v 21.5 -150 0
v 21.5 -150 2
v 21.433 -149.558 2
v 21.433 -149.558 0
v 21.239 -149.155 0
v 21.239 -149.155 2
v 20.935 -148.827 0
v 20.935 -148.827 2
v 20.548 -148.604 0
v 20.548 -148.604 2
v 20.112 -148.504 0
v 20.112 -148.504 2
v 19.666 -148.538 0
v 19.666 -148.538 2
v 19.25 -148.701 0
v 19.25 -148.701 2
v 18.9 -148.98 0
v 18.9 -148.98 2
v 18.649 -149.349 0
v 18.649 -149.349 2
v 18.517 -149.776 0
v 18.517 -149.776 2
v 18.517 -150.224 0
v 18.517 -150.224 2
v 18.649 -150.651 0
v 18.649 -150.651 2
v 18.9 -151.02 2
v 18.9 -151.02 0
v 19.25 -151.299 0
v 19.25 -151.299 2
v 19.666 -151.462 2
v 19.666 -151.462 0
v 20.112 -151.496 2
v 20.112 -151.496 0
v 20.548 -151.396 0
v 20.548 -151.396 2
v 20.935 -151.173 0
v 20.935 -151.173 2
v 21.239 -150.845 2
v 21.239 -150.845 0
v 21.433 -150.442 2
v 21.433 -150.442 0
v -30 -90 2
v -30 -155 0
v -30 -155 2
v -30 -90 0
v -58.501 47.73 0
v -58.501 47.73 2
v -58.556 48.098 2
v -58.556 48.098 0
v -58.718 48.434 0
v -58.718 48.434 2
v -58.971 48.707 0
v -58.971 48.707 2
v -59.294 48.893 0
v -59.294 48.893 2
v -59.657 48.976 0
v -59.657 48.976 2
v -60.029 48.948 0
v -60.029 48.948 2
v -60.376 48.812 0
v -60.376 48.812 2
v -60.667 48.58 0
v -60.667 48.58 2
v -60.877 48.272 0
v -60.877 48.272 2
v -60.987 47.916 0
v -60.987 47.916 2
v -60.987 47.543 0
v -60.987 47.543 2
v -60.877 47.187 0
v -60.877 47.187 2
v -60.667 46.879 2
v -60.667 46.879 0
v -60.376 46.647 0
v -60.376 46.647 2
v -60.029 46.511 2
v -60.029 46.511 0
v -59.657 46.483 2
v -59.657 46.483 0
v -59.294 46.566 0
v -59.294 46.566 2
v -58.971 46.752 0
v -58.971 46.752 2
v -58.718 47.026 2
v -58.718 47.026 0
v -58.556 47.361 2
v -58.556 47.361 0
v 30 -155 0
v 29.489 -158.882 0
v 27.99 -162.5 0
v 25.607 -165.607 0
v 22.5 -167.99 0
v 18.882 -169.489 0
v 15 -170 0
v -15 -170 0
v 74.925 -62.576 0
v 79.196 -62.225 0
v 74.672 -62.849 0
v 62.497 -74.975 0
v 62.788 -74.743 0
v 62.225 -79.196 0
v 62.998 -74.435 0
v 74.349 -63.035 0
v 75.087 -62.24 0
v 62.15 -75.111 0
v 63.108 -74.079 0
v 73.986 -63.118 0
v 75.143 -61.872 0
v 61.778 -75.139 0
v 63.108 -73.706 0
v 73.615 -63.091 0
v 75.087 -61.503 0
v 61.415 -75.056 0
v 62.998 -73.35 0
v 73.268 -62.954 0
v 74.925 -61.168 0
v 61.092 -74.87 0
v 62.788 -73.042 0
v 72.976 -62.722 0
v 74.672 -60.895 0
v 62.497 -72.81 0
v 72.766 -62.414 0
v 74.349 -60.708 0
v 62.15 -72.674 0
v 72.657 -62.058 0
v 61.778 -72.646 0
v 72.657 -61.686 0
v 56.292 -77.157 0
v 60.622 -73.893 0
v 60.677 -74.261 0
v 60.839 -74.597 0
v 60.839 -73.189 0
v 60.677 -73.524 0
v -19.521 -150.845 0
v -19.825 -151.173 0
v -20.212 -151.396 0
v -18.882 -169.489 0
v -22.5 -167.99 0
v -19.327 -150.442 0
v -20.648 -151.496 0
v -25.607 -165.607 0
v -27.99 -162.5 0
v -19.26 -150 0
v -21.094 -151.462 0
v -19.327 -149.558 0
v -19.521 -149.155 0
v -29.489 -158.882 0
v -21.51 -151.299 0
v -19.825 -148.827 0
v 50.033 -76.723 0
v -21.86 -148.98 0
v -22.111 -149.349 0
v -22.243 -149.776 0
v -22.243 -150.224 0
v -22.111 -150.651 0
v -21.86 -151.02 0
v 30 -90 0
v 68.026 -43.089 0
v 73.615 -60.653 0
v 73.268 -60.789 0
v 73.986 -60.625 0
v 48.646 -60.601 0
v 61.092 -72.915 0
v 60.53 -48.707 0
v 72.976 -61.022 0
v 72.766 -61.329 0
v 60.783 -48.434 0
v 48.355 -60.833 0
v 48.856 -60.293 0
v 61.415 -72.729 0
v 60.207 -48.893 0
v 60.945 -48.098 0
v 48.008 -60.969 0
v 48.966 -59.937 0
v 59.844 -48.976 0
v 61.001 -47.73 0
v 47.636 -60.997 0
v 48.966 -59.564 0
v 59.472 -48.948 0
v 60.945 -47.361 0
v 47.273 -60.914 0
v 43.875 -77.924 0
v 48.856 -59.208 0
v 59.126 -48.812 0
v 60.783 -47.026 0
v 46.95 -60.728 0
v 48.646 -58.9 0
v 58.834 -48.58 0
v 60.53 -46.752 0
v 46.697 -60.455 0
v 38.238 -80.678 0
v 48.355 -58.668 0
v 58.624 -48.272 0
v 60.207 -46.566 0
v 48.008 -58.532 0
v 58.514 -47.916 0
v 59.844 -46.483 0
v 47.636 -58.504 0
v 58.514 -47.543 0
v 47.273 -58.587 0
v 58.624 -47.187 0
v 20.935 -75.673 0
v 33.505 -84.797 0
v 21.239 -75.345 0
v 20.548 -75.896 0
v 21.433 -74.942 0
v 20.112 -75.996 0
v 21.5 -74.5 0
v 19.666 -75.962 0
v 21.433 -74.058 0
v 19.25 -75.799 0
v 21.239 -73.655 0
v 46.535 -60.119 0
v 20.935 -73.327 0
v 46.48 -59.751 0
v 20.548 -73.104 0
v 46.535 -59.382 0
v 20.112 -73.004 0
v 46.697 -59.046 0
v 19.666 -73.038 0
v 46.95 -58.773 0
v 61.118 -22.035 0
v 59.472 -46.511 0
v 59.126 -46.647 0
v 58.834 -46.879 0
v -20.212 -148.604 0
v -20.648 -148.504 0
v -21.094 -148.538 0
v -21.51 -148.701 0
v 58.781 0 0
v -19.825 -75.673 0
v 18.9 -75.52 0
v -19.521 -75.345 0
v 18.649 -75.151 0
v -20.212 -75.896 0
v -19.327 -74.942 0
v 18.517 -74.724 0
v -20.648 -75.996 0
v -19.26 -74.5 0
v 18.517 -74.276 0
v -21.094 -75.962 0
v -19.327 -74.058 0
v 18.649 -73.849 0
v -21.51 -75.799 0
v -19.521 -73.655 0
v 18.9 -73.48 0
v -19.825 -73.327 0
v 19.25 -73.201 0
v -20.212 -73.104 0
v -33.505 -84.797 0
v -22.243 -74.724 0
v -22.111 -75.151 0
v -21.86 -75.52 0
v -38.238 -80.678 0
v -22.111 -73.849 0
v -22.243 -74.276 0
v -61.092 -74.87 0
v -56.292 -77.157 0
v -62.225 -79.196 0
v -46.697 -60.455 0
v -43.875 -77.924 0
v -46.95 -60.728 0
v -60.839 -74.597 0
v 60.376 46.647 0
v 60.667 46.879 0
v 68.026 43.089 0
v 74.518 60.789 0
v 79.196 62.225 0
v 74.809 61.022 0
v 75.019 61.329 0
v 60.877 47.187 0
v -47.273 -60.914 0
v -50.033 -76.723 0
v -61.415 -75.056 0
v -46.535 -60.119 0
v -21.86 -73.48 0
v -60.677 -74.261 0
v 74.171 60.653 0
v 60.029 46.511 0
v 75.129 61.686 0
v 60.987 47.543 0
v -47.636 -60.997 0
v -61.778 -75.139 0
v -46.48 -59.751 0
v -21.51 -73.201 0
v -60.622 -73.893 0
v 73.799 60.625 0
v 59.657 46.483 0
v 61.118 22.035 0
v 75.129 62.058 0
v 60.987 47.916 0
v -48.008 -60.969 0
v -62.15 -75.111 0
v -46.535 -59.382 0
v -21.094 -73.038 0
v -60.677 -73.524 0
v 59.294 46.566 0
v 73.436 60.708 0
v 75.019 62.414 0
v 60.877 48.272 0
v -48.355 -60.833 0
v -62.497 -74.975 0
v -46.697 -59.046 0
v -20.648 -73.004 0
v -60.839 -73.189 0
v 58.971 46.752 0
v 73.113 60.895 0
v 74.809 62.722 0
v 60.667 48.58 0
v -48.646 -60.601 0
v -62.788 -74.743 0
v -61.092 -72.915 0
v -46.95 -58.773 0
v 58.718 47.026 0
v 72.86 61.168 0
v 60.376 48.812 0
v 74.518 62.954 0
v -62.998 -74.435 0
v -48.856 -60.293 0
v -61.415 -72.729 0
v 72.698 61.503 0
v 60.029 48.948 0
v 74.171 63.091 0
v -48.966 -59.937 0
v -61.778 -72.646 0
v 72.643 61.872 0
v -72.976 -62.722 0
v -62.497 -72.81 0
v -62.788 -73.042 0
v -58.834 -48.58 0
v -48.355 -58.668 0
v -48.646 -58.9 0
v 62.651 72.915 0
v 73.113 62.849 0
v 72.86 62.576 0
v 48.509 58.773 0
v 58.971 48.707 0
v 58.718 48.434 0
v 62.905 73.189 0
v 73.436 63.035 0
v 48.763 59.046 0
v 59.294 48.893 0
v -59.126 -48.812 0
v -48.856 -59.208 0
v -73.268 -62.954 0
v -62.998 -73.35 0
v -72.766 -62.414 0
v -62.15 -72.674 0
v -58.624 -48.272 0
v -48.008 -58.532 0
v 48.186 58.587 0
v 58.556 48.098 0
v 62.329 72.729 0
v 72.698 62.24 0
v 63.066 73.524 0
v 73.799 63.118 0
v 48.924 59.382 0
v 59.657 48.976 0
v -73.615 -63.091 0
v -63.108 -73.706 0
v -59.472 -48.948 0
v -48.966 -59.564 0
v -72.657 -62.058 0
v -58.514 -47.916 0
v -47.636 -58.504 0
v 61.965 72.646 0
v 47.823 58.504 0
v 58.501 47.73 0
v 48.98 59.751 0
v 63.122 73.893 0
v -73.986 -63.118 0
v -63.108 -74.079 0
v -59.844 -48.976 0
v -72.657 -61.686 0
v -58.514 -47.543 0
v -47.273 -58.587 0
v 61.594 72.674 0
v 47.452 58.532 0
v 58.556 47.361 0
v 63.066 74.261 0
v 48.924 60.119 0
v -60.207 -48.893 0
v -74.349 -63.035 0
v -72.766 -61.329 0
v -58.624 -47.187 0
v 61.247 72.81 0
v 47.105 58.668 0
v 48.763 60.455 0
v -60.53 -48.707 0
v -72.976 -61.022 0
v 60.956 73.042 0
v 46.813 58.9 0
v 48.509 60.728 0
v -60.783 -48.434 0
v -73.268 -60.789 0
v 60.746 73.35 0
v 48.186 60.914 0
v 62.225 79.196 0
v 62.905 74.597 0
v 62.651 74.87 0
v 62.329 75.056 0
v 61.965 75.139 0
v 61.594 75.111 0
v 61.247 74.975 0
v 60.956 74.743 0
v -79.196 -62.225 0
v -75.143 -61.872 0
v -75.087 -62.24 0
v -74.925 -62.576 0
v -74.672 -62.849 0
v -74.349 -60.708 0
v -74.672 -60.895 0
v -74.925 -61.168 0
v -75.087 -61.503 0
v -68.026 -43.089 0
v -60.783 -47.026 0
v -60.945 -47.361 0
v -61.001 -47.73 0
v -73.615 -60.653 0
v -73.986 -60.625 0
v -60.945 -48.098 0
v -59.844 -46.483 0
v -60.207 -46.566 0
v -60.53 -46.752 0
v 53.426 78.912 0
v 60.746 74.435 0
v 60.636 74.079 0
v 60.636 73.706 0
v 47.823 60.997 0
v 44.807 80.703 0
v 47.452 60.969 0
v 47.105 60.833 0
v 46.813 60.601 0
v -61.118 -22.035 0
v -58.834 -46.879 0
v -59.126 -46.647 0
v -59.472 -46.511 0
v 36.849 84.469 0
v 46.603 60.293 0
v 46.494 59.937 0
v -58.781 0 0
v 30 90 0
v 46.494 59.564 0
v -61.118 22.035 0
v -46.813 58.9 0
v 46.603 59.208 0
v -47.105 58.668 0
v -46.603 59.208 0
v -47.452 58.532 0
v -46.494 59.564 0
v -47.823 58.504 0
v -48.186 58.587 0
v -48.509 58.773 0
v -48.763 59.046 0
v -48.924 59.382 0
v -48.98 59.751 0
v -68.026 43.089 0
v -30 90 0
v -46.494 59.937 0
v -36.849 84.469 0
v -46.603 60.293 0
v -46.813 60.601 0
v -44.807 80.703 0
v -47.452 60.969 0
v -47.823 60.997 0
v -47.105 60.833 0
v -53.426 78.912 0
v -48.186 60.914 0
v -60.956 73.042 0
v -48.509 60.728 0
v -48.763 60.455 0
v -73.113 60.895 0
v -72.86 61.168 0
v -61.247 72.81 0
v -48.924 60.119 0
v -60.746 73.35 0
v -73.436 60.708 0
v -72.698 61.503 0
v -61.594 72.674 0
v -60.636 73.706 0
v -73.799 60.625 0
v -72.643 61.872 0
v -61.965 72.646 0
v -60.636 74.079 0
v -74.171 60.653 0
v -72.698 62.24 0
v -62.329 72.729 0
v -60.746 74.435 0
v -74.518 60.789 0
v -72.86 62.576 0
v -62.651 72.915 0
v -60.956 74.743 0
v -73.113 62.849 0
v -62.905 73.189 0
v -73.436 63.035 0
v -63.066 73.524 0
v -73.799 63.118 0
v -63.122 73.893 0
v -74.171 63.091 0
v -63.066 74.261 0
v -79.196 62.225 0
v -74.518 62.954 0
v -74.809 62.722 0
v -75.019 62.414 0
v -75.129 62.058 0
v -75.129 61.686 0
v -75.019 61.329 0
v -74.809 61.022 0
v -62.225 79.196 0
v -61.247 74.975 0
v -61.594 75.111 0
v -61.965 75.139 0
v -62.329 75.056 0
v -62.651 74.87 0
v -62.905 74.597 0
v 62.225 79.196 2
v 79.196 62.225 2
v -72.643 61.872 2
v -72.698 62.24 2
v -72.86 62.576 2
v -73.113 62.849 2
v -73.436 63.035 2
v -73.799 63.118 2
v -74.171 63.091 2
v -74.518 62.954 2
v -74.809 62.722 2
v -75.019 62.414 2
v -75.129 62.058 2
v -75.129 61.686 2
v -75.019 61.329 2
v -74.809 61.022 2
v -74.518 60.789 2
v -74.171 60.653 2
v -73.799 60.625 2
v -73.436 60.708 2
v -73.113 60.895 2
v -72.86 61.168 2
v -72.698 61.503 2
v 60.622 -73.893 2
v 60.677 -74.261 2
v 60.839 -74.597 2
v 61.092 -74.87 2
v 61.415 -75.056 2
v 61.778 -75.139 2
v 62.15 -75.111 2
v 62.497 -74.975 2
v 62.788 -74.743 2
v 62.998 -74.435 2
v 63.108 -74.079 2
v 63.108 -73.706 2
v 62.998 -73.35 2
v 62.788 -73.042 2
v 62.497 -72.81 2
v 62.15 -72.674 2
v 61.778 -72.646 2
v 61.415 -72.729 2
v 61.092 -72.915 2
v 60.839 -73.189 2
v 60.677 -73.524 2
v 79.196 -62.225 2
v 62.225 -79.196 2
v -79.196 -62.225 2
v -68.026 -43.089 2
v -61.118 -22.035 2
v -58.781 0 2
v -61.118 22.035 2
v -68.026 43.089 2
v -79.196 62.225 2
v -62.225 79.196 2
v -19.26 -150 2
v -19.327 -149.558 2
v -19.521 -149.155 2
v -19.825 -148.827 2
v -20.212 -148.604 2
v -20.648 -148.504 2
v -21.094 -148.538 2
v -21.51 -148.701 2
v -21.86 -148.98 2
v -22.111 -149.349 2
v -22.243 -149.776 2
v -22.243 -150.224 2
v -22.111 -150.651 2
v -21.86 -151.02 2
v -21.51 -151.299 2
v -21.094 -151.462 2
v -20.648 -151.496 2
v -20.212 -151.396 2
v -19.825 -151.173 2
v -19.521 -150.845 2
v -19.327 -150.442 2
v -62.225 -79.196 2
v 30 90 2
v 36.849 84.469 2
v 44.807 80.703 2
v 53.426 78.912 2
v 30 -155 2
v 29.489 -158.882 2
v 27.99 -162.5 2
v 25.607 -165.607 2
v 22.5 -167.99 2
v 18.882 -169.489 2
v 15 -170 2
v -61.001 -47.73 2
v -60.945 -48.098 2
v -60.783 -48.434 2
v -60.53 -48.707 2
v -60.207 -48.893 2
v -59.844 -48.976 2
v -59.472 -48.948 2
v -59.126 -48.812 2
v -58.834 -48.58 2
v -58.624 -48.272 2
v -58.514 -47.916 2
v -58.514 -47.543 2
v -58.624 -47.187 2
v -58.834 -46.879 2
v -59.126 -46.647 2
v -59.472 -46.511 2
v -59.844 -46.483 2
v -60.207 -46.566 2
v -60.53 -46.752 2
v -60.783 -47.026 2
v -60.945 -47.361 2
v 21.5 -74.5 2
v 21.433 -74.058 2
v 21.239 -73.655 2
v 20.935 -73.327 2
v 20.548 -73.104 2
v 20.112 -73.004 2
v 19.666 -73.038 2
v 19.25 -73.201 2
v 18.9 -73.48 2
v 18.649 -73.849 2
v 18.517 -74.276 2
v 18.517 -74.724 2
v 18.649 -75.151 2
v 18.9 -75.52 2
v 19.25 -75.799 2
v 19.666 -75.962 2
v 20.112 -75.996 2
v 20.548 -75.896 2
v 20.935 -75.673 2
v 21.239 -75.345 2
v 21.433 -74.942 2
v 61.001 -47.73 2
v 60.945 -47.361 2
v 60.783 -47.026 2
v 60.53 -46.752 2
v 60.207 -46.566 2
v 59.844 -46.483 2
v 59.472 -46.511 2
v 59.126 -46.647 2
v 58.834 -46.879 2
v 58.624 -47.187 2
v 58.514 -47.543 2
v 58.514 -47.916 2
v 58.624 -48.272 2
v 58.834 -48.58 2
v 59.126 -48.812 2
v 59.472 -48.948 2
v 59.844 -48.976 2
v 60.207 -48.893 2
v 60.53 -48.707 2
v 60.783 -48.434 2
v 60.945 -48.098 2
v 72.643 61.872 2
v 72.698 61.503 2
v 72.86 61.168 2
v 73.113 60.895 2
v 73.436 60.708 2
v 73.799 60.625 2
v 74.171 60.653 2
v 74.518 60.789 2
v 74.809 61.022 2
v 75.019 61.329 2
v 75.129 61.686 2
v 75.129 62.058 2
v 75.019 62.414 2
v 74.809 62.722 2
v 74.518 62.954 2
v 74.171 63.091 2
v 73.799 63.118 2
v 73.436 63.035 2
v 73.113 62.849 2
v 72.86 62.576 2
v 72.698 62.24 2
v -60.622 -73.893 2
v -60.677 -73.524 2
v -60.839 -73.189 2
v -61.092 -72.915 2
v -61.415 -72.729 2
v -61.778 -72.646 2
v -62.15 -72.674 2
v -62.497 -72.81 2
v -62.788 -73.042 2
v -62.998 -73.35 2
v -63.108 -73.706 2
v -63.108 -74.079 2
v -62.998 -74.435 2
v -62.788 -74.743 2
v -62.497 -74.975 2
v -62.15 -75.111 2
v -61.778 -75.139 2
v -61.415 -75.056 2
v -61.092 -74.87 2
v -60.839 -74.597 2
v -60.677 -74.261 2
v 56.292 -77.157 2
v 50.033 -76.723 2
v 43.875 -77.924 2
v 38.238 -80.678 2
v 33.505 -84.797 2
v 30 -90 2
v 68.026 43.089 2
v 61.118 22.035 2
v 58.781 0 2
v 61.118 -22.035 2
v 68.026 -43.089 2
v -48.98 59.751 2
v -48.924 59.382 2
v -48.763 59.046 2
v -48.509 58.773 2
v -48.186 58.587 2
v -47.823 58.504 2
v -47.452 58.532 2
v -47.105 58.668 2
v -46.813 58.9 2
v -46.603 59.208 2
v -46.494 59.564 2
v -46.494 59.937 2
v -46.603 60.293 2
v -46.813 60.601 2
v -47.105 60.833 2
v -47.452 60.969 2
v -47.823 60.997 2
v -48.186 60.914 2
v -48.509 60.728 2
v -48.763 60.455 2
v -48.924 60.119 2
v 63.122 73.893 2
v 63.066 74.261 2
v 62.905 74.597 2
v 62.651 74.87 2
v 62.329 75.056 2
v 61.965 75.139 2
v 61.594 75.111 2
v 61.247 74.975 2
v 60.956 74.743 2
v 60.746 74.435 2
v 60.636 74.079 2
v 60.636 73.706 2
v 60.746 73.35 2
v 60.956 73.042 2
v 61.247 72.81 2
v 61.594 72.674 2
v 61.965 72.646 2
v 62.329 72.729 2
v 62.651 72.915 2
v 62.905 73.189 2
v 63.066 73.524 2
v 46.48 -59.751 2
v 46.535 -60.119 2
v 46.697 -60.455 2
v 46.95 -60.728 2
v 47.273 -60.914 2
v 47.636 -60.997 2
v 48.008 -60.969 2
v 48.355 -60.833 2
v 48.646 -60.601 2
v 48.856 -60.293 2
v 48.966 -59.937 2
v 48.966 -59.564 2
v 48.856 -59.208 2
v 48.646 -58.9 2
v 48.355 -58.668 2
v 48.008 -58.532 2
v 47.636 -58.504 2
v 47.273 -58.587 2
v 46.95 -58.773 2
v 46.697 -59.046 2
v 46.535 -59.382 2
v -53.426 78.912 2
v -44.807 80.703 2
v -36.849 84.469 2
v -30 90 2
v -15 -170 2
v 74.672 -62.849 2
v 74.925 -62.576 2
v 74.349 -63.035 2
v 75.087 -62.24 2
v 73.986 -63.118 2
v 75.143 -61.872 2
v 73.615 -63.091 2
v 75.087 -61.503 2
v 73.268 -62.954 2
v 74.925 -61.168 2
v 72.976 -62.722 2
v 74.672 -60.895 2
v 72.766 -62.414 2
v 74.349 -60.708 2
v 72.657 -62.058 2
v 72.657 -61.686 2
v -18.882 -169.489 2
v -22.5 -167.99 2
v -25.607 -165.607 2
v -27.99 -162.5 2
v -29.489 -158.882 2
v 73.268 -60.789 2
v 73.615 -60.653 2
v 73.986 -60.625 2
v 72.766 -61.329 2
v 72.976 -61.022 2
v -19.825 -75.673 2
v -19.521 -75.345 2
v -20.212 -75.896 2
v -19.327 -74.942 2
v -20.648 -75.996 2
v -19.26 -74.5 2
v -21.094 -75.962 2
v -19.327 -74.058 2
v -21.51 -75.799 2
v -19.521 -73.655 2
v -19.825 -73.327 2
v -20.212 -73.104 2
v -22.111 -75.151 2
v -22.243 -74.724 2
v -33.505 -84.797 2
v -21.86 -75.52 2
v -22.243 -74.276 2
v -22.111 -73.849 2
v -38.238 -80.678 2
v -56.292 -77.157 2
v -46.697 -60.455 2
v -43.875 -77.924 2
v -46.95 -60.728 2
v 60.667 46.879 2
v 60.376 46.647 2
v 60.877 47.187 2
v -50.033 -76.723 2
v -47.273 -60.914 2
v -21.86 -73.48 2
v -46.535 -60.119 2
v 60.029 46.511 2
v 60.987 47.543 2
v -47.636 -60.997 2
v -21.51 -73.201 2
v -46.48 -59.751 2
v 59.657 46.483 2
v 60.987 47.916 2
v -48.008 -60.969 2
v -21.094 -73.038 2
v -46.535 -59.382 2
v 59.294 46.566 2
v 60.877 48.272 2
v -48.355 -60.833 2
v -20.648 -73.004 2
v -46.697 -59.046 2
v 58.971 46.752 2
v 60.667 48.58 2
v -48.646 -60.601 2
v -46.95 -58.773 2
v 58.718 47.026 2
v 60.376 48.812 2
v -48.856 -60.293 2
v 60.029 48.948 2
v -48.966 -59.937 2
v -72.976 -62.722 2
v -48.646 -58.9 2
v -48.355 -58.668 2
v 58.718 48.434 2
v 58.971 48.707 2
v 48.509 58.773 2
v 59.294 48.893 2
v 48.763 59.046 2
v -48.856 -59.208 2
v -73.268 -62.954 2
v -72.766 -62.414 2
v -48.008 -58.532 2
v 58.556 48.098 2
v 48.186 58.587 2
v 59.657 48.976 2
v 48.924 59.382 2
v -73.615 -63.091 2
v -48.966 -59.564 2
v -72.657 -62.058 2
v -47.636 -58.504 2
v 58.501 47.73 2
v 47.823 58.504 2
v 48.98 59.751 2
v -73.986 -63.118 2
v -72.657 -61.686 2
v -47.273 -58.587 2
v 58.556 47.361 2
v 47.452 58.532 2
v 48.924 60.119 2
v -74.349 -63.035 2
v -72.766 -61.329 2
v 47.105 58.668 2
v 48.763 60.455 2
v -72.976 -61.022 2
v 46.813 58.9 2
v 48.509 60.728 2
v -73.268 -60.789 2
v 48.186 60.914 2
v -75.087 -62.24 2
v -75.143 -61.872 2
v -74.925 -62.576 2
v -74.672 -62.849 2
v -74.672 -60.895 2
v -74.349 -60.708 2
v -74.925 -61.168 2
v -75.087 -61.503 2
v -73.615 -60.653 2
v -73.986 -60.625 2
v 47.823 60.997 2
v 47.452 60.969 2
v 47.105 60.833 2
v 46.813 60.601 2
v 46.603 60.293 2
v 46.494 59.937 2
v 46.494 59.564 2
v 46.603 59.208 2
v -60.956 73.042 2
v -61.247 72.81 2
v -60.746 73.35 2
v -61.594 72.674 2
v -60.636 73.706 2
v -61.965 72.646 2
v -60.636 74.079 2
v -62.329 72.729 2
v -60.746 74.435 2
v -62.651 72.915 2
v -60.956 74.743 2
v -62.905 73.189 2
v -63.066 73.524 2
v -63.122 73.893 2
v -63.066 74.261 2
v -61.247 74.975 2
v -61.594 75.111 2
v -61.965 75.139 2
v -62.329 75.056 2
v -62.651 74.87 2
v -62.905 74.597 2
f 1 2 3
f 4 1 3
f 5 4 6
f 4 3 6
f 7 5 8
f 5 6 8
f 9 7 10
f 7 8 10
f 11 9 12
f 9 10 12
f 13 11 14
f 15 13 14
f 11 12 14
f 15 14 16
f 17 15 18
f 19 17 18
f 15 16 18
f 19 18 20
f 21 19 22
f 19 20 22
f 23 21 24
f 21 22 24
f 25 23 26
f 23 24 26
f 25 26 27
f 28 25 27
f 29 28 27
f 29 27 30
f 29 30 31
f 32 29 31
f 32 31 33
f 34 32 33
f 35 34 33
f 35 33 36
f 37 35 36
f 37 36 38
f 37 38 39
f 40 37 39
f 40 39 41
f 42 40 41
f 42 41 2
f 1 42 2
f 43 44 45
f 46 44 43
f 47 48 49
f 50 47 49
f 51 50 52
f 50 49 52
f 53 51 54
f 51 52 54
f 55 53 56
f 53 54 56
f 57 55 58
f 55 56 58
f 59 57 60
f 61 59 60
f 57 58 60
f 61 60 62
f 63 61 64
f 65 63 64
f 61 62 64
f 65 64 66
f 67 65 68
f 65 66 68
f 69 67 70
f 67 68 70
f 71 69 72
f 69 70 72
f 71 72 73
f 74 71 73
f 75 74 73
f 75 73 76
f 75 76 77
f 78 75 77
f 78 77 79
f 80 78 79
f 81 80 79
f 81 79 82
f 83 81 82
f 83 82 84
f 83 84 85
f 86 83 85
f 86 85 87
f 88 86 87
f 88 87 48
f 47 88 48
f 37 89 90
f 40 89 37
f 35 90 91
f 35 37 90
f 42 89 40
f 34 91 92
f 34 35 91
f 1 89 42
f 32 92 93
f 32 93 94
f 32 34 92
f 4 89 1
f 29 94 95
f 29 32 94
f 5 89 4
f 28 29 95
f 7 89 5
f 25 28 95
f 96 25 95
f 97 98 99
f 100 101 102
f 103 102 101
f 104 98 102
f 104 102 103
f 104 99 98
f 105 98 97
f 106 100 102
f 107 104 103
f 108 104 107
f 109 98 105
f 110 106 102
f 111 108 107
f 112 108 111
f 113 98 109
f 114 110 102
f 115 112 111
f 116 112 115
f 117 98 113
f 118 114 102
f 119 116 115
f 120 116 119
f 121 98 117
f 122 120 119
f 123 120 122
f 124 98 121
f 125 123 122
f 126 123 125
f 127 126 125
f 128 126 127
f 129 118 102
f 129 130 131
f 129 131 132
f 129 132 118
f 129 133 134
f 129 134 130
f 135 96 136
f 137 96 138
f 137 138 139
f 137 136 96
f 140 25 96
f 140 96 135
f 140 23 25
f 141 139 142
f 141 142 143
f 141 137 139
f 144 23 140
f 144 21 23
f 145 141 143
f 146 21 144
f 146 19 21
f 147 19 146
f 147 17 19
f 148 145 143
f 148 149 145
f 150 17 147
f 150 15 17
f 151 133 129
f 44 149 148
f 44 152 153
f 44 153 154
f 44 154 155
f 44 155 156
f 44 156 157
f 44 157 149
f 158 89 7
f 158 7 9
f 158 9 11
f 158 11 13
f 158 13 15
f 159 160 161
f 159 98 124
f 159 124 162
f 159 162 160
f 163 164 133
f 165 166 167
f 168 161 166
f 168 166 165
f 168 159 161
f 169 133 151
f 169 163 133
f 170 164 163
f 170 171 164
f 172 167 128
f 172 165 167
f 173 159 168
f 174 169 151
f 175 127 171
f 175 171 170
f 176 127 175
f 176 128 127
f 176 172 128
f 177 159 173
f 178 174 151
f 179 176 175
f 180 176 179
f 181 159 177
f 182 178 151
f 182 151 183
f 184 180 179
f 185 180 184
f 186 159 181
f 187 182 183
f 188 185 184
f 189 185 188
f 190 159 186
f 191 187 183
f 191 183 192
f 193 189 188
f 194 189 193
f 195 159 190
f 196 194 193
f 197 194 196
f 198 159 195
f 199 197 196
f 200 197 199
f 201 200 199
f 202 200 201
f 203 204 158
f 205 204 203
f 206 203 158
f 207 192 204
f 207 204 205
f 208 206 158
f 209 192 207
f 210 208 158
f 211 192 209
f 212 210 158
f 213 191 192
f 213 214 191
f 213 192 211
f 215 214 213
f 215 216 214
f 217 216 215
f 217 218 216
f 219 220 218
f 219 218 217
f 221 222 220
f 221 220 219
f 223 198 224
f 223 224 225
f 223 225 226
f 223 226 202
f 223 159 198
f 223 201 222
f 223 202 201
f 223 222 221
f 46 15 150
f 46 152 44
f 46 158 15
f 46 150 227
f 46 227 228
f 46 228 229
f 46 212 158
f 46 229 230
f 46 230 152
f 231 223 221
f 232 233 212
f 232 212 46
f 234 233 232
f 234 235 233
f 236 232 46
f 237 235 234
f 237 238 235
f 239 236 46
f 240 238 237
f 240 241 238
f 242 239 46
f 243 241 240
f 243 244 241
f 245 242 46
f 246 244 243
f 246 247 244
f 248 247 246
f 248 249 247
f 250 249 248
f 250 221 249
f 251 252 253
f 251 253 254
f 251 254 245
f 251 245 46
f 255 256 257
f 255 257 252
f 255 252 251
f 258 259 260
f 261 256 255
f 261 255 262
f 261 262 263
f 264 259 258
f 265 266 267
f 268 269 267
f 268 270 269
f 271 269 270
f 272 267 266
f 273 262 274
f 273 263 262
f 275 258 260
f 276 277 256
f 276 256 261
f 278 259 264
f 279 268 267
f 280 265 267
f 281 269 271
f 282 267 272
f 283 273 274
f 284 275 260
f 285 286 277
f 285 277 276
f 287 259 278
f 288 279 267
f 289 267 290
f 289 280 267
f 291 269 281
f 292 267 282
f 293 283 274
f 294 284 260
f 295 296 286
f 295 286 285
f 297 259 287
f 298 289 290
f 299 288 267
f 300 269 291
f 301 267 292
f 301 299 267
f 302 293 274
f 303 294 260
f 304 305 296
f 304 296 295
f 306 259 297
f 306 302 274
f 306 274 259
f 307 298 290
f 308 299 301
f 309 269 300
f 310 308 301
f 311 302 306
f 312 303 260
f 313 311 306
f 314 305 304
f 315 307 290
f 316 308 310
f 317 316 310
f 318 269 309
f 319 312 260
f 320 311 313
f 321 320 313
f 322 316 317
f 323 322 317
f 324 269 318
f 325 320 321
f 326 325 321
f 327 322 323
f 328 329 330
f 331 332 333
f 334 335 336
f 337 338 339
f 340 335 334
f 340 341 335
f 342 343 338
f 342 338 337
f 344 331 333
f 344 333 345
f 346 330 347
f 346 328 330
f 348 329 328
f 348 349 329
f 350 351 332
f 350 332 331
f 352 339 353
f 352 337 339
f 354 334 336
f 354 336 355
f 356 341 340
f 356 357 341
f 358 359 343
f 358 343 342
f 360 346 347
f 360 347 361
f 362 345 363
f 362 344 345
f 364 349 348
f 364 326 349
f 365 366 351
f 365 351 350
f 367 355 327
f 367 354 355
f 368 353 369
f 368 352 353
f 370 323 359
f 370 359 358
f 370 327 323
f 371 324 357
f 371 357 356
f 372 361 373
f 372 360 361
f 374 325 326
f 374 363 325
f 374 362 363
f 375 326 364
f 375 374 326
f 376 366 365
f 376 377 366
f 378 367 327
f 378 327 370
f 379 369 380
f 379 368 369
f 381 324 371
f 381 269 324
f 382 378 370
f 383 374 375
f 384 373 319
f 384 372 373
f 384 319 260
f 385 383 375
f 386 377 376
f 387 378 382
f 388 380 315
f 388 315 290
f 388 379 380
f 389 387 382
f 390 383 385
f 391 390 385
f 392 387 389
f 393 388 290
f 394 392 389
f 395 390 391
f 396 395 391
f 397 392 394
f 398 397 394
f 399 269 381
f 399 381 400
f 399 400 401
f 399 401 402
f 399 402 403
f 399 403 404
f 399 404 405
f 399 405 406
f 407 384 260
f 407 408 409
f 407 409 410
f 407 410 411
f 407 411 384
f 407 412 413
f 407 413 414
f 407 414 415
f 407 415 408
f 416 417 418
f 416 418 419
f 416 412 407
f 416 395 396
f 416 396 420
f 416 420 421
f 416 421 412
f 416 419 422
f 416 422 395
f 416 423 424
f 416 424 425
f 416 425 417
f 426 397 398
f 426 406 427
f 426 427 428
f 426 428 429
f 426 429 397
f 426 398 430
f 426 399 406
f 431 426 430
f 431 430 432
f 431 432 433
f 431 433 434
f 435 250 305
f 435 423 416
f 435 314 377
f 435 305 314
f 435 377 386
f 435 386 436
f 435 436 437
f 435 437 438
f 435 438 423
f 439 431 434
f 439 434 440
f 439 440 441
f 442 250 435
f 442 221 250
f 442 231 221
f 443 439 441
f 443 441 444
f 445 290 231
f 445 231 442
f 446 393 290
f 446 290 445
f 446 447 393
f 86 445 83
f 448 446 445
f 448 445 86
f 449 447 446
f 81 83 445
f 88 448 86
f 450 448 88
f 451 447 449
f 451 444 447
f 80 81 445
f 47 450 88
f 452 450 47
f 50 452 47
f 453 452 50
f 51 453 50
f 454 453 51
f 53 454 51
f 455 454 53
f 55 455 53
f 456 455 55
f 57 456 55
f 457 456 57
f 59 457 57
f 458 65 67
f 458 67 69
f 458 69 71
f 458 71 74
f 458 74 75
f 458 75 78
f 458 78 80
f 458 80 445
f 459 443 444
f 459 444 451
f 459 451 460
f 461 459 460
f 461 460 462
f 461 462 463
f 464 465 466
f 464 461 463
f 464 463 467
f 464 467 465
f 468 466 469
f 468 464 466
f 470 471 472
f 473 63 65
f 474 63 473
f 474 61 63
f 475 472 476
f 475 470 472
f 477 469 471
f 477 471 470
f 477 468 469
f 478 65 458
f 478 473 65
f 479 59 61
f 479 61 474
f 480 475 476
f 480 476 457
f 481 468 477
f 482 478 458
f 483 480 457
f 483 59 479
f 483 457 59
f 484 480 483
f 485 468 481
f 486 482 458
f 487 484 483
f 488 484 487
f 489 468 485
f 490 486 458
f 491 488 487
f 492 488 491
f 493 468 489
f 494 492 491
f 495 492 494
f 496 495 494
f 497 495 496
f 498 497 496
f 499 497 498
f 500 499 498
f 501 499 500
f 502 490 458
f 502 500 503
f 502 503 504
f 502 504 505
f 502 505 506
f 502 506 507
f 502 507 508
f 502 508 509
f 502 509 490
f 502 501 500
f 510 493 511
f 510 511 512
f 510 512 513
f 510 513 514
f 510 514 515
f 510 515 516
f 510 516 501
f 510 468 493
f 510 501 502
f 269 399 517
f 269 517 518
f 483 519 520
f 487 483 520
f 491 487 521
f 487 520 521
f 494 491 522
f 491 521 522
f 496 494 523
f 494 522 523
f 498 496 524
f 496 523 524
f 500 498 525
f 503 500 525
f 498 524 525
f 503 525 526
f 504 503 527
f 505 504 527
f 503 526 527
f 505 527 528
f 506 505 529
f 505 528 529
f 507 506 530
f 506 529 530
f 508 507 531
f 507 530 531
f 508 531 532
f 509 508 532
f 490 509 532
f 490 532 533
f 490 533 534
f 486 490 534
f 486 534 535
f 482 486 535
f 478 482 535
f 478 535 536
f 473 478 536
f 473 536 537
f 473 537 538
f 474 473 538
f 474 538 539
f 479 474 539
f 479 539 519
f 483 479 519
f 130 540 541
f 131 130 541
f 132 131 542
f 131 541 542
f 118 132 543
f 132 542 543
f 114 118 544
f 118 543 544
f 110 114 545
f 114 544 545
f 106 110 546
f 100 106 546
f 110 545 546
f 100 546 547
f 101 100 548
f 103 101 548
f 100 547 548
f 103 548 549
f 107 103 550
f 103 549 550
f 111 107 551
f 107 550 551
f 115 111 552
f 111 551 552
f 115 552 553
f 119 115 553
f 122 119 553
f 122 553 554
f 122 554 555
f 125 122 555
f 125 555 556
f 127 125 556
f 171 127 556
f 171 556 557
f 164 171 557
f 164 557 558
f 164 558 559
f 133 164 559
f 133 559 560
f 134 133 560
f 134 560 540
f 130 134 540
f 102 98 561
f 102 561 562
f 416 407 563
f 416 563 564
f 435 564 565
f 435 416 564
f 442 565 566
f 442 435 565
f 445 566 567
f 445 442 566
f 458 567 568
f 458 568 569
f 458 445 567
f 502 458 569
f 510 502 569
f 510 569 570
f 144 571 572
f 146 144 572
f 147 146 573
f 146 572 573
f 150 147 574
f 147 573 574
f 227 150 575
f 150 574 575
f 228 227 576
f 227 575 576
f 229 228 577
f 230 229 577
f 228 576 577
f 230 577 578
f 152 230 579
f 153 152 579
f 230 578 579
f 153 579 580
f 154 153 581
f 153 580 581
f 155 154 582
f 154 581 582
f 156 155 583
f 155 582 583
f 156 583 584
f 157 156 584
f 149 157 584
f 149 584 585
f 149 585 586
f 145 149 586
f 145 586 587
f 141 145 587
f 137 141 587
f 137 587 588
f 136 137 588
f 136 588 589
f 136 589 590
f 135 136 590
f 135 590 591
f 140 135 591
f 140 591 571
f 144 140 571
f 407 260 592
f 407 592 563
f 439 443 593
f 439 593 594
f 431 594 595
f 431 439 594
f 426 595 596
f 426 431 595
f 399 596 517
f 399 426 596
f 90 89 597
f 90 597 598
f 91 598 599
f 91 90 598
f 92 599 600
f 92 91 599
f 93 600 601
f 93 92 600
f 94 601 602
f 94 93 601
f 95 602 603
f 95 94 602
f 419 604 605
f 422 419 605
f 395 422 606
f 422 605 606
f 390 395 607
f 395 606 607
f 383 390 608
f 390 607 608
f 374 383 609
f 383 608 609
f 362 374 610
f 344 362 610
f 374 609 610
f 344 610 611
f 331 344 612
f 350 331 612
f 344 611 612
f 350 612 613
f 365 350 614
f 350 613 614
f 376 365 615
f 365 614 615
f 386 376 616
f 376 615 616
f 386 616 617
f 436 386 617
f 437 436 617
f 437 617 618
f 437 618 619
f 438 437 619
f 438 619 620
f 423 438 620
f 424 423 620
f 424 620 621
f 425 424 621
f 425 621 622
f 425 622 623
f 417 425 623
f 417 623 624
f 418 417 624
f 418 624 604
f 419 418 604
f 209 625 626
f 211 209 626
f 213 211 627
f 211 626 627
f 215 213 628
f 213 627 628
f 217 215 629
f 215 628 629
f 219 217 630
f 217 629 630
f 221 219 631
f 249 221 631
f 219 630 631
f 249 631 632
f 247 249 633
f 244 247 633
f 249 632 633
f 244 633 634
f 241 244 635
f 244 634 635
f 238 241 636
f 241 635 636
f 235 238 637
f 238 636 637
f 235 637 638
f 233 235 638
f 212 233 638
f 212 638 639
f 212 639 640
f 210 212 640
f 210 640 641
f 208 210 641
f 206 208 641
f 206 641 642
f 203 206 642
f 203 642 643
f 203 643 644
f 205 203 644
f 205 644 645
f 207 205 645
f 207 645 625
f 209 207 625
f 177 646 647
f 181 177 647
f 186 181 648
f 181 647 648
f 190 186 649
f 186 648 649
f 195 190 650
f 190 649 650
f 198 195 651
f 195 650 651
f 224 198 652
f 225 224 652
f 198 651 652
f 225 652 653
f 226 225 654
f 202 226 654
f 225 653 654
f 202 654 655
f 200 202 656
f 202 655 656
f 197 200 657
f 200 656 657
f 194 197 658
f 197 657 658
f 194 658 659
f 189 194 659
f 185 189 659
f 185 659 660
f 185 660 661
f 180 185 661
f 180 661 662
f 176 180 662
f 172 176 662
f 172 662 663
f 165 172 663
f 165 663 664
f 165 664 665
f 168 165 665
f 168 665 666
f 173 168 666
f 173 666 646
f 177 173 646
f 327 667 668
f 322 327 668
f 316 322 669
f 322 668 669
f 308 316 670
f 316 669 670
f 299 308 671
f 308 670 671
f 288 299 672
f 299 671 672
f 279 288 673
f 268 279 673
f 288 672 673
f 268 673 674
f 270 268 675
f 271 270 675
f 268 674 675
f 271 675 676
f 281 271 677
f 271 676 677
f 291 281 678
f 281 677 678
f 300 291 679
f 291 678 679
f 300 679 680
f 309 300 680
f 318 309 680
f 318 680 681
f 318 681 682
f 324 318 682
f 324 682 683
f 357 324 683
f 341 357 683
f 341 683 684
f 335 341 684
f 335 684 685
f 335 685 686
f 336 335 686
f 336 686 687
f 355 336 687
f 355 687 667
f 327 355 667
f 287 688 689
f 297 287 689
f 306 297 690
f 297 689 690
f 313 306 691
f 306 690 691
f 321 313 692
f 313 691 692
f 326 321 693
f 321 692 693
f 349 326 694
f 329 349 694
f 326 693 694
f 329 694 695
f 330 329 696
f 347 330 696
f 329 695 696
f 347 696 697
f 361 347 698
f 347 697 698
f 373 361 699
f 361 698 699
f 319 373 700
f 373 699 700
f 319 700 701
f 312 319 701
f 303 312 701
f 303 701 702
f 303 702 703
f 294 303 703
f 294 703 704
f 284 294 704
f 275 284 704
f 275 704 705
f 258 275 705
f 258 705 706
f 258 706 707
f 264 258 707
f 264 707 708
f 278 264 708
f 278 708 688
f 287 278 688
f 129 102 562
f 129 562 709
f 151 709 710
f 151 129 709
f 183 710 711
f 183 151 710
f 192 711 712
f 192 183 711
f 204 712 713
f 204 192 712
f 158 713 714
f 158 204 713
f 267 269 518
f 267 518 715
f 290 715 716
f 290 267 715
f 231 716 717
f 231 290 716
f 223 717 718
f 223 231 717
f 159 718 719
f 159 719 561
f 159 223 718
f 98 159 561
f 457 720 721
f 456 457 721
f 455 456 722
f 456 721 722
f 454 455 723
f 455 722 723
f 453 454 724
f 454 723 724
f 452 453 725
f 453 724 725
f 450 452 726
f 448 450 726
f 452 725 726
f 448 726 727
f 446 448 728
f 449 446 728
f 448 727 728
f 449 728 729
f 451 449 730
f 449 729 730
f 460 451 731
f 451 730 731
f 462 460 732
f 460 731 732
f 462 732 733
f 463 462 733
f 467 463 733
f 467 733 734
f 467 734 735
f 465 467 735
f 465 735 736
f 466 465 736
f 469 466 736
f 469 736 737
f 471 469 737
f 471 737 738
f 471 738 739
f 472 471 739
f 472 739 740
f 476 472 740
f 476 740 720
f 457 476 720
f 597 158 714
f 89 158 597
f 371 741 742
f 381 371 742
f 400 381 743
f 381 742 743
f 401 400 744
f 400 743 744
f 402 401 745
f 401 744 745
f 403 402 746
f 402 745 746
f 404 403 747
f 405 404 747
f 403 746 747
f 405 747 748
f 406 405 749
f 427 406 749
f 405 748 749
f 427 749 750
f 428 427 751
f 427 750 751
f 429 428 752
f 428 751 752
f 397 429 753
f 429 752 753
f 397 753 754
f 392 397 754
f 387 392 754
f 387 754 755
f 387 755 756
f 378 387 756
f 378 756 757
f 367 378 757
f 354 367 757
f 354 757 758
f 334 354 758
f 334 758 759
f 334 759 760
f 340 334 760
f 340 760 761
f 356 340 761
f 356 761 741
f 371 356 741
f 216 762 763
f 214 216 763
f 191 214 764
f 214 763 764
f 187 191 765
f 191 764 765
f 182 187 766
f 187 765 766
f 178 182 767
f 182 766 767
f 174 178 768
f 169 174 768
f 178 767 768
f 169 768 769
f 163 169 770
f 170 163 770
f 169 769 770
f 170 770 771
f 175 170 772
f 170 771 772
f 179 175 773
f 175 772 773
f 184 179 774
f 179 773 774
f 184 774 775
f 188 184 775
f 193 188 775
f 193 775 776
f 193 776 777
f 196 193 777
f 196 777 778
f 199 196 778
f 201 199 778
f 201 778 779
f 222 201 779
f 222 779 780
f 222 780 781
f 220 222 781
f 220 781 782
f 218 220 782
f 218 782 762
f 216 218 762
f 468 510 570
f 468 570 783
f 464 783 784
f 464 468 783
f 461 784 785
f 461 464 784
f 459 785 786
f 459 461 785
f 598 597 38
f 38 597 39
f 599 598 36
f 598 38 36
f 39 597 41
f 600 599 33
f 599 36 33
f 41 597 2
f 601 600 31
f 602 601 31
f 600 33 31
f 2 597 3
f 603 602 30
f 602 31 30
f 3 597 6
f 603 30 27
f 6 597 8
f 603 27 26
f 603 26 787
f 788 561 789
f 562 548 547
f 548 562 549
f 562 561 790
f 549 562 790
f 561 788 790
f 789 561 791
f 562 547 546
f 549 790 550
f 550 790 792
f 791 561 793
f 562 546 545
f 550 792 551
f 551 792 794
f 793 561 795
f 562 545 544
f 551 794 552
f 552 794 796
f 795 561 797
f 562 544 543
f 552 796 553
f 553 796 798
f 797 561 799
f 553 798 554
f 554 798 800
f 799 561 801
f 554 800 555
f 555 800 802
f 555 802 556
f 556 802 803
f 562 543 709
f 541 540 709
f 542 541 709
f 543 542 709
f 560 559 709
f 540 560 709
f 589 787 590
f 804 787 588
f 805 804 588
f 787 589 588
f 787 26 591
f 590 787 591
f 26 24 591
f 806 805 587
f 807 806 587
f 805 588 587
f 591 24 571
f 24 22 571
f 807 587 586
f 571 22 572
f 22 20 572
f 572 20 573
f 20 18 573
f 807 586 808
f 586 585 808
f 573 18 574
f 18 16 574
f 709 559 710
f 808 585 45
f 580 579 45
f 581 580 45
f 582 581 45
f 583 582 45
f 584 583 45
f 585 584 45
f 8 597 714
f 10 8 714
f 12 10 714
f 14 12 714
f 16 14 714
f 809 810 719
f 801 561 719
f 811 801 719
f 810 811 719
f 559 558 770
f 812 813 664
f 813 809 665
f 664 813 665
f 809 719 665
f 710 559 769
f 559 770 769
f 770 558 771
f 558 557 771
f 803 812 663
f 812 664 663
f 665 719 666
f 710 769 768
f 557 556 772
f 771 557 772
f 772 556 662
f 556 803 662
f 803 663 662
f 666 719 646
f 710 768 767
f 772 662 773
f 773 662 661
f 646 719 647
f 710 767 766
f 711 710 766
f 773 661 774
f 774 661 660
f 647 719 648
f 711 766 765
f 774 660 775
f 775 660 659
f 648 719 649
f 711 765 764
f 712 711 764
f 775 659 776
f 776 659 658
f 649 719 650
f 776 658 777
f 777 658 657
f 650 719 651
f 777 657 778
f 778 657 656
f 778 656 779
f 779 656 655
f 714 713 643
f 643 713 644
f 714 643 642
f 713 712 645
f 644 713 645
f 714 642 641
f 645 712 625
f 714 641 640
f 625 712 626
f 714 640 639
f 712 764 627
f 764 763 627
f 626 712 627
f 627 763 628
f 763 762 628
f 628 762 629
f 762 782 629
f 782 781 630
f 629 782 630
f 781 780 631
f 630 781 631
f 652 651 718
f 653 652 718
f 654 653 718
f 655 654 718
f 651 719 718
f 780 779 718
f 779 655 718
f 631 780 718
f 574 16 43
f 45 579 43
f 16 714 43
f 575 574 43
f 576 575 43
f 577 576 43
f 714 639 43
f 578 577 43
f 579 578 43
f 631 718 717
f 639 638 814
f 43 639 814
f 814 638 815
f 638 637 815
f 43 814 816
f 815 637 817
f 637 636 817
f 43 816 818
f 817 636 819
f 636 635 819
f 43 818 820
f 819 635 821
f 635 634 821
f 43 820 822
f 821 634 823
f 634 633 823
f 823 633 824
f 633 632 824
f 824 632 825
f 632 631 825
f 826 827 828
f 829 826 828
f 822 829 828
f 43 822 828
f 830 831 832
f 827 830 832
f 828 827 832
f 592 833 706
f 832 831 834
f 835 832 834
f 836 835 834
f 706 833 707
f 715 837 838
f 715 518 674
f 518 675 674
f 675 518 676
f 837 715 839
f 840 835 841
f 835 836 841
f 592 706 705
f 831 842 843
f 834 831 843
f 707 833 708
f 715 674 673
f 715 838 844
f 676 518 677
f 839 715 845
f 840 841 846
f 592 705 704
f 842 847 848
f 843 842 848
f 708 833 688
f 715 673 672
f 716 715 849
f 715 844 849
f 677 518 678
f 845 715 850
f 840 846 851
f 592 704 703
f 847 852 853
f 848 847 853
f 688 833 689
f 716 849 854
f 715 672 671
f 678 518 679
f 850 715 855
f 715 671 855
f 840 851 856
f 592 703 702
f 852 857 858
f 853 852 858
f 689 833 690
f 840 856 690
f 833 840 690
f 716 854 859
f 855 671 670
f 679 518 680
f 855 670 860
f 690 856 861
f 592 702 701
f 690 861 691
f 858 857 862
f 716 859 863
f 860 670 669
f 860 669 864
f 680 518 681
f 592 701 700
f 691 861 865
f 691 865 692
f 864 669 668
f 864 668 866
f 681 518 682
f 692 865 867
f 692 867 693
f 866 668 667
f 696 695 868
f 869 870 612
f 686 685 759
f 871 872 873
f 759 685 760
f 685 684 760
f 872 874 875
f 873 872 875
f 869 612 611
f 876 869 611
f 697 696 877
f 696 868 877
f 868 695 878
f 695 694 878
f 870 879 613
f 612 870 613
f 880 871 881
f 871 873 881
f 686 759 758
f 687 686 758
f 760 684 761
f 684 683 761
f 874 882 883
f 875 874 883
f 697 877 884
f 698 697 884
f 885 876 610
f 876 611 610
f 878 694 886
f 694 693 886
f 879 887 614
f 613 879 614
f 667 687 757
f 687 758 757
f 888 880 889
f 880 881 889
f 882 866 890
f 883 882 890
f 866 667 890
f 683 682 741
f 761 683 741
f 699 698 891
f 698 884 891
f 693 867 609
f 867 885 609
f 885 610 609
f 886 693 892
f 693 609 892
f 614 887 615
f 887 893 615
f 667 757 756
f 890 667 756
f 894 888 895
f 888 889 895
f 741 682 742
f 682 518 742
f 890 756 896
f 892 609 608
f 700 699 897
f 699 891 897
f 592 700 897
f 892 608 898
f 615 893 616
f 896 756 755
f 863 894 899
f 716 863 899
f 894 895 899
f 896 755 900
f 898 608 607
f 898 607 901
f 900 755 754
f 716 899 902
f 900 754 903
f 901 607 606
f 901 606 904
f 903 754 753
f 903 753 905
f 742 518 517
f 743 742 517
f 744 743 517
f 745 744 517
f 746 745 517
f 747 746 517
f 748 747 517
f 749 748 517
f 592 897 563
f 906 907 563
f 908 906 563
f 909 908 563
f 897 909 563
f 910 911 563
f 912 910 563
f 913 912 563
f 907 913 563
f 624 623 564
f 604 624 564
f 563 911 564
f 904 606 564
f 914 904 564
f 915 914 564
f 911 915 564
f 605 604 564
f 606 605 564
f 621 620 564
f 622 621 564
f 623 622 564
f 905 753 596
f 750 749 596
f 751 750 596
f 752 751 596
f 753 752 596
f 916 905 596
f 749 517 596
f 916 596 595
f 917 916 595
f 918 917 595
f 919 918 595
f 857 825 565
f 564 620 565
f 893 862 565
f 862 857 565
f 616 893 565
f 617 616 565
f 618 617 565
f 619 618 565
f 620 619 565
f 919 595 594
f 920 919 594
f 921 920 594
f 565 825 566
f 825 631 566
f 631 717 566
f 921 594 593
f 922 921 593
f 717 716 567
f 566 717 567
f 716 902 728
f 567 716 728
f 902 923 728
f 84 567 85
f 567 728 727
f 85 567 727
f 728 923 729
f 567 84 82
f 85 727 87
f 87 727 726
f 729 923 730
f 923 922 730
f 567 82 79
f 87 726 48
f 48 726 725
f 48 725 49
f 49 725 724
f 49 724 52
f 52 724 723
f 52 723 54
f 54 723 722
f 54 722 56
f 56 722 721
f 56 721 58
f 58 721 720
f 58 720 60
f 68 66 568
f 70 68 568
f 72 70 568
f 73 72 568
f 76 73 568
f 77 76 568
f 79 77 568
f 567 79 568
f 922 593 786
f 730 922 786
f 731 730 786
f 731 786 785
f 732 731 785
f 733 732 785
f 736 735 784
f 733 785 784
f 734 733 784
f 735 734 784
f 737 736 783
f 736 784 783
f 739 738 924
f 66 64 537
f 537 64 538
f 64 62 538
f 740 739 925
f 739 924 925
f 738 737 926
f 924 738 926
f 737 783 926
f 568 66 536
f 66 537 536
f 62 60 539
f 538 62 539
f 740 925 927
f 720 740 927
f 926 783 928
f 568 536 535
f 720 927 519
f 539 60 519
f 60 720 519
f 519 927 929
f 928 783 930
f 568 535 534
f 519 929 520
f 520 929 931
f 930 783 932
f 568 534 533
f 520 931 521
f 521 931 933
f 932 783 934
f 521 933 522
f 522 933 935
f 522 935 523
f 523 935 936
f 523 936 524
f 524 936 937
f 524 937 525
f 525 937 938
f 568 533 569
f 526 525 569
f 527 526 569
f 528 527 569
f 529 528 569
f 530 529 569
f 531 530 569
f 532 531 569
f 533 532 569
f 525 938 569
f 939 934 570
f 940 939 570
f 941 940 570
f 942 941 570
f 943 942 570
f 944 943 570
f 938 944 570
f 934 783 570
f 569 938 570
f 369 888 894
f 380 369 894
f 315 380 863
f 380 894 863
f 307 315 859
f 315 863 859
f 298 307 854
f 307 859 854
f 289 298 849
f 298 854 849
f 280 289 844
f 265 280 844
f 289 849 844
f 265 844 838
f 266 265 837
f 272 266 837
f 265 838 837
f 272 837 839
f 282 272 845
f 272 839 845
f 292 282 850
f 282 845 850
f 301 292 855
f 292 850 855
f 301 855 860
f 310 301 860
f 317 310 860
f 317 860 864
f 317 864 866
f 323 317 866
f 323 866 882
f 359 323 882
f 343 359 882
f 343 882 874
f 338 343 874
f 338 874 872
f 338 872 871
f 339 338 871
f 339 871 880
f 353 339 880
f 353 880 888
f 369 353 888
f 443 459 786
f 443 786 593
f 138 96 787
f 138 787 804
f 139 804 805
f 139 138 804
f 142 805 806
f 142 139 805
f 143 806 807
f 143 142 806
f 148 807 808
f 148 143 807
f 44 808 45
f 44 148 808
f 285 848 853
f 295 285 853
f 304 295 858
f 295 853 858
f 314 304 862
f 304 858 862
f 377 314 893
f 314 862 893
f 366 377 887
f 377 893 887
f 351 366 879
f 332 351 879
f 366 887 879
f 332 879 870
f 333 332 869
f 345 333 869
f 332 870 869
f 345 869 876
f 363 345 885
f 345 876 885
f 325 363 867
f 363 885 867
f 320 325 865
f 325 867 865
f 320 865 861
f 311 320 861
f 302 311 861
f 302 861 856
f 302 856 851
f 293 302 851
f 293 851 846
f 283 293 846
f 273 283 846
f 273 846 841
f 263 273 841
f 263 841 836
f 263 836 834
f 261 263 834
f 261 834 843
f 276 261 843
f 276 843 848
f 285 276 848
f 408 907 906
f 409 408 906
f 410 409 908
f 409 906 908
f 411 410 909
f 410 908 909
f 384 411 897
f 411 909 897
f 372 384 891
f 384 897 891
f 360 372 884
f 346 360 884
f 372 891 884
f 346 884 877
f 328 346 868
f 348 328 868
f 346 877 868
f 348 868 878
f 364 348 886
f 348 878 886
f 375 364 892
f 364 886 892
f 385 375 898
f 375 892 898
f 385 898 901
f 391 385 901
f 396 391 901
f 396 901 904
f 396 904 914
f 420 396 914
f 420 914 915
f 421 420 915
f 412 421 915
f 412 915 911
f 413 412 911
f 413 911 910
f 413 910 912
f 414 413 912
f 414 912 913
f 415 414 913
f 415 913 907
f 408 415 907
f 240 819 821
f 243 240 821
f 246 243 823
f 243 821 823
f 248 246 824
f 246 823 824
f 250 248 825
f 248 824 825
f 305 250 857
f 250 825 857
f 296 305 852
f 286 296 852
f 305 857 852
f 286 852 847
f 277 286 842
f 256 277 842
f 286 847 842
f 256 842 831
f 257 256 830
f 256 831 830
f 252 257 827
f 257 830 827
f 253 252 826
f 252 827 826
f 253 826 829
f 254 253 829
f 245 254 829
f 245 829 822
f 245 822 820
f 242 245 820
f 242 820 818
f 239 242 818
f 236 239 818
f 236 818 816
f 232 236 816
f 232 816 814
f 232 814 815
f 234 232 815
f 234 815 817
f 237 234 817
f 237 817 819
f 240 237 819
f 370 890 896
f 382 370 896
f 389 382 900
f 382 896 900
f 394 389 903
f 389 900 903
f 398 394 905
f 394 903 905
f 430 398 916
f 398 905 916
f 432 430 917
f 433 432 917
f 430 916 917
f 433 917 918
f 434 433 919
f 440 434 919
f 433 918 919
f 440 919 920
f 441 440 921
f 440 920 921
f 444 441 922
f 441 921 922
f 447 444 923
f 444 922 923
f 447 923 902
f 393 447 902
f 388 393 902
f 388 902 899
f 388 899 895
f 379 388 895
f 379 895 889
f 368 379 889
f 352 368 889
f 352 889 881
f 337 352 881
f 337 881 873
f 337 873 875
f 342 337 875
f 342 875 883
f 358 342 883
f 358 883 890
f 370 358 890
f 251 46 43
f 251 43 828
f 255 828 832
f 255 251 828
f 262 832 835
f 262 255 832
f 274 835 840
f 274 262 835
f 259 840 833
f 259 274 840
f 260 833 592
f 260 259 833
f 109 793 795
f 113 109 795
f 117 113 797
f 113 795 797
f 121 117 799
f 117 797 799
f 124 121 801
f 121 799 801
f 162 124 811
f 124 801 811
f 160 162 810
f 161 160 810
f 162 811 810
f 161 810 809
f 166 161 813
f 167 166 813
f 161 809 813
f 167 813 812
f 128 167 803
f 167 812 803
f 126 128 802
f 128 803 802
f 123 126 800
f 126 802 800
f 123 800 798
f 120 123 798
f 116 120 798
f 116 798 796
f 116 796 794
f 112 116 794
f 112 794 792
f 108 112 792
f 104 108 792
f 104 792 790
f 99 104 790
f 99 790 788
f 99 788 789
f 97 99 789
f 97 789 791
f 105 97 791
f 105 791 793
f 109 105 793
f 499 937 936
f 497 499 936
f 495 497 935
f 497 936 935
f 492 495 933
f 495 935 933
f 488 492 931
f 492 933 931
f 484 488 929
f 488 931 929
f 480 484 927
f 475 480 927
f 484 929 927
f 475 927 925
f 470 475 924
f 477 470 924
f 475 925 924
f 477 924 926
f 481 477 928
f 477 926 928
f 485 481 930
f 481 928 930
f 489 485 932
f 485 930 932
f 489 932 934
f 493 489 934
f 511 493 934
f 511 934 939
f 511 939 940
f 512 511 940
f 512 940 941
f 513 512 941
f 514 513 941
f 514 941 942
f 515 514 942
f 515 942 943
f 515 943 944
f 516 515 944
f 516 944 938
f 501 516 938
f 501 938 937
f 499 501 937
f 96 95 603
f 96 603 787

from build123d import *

# Parameters (mm, degrees)
BOSS_EXTRUDE1_DEPTH = 2
SKETCH3_R           = 1.25
CUT_EXTRUDE1_DEPTH  = 188.552659272
SKETCH4_R           = 1.5
CUT_EXTRUDE2_DEPTH  = 188.552659272


with BuildPart() as part:
    # Sketch2 → Boss-Extrude1 (new body)
    with BuildSketch(Plane.XY):
        with BuildLine():
            Line((-79.195959493, 62.225396744), (-62.225396744, 79.195959493))
            ThreePointArc((-62.225396744, 79.195959493), (-44.806778225, 80.702789346), (-30, 90))
            Line((-30, 90), (30, 90))
            ThreePointArc((30, 90), (44.806778225, 80.702789346), (62.225396744, 79.195959493))
            Line((62.225396744, 79.195959493), (79.195959493, 62.225396744))
            ThreePointArc((79.195959493, 62.225396744), (58.781303002, 0), (79.195959493, -62.225396744))
            Line((79.195959493, -62.225396744), (62.225396744, -79.195959493))
            ThreePointArc((62.225396744, -79.195959493), (43.875108319, -77.923881554), (30, -90))
            Line((30, -90), (30, -155))
            ThreePointArc((30, -155), (25.606601718, -165.606601718), (15, -170))
            Line((15, -170), (-15, -170))
            ThreePointArc((-15, -170), (-25.606601718, -165.606601718), (-30, -155))
            Line((-30, -155), (-30, -90))
            ThreePointArc((-30, -90), (-43.875108319, -77.923881554), (-62.225396744, -79.195959493))
            Line((-62.225396744, -79.195959493), (-79.195959493, -62.225396744))
            ThreePointArc((-79.195959493, -62.225396744), (-58.781303002, 0), (-79.195959493, 62.225396744))
        make_face()
    extrude(amount=BOSS_EXTRUDE1_DEPTH)

    # Sketch3 → Cut-Extrude1 (cut, through all)
    with BuildSketch(Plane.XY.offset(2)):
        with Locations((-73.892658634, 61.871843354)):
            Circle(SKETCH3_R)
        with Locations((-59.75052301, 47.72970773)):
            Circle(SKETCH3_R)
        with Locations(Location((-61.871843354, 73.892658634, 0), (0, 0, 180))):
            Circle(SKETCH3_R)
        with Locations(Location((-47.72970773, 59.75052301, 0), (0, 0, 180))):
            Circle(SKETCH3_R)
        with Locations(Location((59.75052301, 47.72970773, 0), (0, 0, 180))):
            Circle(SKETCH3_R)
        with Locations(Location((73.892658634, 61.871843354, 0), (0, 0, 180))):
            Circle(SKETCH3_R)
        with Locations((61.871843354, 73.892658634)):
            Circle(SKETCH3_R)
        with Locations((47.72970773, 59.75052301)):
            Circle(SKETCH3_R)
        with Locations(Location((-59.75052301, -47.72970773, 0), (0, 0, 180))):
            Circle(SKETCH3_R)
        with Locations((-47.72970773, -59.75052301)):
            Circle(SKETCH3_R)
        with Locations((-61.871843354, -73.892658634)):
            Circle(SKETCH3_R)
        with Locations(Location((-73.892658634, -61.871843354, 0), (0, 0, 180))):
            Circle(SKETCH3_R)
        with Locations((59.75052301, -47.72970773)):
            Circle(SKETCH3_R)
        with Locations((73.892658634, -61.871843354)):
            Circle(SKETCH3_R)
        with Locations(Location((61.871843354, -73.892658634, 0), (0, 0, 180))):
            Circle(SKETCH3_R)
        with Locations(Location((47.72970773, -59.75052301, 0), (0, 0, 180))):
            Circle(SKETCH3_R)
    extrude(amount=-CUT_EXTRUDE1_DEPTH, mode=Mode.SUBTRACT)

    # Sketch4 → Cut-Extrude2 (cut, through all)
    with BuildSketch(Plane.XY.offset(2)):
        with Locations((-20.76, -150)):
            Circle(SKETCH4_R)
        with Locations((20, -150)):
            Circle(SKETCH4_R)
        with Locations((-20.76, -74.5)):
            Circle(SKETCH4_R)
        with Locations((20, -74.5)):
            Circle(SKETCH4_R)
    extrude(amount=-CUT_EXTRUDE2_DEPTH, mode=Mode.SUBTRACT)


solid = part.part
